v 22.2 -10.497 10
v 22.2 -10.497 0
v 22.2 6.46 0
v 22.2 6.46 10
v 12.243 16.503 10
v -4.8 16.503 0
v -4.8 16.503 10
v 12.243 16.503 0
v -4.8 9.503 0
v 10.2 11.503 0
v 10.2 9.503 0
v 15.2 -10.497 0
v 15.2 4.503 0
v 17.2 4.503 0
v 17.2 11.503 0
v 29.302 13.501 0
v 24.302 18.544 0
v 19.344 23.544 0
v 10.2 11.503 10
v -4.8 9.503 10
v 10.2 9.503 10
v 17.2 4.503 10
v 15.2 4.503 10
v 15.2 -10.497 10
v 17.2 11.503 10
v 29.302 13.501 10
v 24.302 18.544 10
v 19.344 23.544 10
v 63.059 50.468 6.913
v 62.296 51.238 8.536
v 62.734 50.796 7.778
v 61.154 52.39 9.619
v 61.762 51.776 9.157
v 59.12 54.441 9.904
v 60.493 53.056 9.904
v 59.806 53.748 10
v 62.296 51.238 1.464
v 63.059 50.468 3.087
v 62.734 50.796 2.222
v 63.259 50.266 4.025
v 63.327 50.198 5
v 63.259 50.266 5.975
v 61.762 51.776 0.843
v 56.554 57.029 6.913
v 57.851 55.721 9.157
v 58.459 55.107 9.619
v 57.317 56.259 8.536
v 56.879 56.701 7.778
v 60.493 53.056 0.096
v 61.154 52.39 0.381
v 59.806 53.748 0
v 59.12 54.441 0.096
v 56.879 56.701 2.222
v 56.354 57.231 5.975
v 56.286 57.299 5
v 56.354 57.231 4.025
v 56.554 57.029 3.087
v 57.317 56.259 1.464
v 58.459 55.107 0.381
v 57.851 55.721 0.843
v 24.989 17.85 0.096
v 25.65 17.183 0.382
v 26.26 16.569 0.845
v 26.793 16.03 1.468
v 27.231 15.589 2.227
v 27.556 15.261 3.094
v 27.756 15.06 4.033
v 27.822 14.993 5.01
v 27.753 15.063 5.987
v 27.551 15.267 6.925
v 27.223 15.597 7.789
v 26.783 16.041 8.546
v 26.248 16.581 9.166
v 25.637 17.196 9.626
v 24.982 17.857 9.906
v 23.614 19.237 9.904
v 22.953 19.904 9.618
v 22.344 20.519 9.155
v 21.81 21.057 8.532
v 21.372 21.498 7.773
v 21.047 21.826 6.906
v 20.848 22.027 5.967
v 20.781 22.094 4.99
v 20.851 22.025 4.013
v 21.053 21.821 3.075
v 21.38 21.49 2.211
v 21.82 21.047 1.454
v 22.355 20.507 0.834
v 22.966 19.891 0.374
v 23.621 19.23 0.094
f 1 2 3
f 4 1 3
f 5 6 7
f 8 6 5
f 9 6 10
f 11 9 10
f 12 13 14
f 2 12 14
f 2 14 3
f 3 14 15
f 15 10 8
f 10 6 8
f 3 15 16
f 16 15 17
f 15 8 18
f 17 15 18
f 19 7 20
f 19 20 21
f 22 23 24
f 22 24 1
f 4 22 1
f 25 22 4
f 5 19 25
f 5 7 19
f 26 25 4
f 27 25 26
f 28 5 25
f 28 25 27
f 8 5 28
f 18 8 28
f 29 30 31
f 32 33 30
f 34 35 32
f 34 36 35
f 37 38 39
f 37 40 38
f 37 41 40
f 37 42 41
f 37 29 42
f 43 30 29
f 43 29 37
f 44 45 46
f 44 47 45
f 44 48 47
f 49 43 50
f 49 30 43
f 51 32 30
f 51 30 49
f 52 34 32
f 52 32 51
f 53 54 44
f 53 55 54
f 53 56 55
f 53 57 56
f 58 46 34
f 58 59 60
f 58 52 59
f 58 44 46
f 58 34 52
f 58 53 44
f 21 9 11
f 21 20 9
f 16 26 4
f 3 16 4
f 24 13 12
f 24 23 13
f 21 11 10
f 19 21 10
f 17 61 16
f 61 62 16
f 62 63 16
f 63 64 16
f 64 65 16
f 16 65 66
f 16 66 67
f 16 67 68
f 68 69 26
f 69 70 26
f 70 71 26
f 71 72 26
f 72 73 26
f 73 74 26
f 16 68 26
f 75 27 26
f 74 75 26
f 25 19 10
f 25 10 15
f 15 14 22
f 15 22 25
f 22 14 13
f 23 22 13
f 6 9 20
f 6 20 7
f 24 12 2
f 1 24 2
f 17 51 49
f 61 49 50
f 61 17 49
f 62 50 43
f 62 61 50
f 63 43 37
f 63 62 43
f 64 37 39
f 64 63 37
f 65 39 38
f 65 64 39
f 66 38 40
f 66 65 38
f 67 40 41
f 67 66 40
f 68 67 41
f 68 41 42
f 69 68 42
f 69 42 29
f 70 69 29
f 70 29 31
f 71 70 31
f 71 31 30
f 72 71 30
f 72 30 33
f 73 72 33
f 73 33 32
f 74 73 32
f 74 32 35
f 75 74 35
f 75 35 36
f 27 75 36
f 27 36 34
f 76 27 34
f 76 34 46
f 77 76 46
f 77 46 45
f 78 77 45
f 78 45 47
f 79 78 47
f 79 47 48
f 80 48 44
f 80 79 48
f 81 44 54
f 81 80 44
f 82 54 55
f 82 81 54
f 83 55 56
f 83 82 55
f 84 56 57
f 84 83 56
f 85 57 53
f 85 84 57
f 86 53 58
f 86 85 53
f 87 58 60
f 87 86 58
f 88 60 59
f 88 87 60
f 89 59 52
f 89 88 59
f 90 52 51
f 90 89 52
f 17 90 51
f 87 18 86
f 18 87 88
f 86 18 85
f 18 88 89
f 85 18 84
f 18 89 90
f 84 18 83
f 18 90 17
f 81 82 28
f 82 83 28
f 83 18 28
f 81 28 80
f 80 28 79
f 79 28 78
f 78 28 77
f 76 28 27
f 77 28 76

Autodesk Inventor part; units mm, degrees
ref_plane "YZ Plane" through (0, 0, 0) normal (1, 0, 0) x (0, 1, 0)
ref_plane "XZ Plane" through (0, 0, 0) normal (0, 1, 0) x (-1, 0, 0)
ref_plane "XY Plane" through (0, 0, 0) normal (0, 0, 1) x (1, 0, 0)
sketch "Náčrt1" plane through (0, 0, 0) normal (0, 0, 1) x (1, 0, 0)
  point P0 (0, 0)
sketch "Náčrt2" plane through (0, 0, 0) normal (0, 0, 1) x (1, 0, 0)
  line L0 (17.2004, -10.497) -> (22.2004, -10.497)
  line L1 (-4.7996, 11.503) -> (-4.7996, 16.503)
  line L2 (-4.7996, 11.503) -> (17.2004, 11.503)
  line L3 (17.2004, -10.497) -> (17.2004, 11.503)
  line L4 (22.2004, -10.497) -> (22.2004, 11.503)
  line L5 (-4.7996, 16.503) -> (22.2004, 16.503)
  line L6 (22.2004, 11.503) -> (22.2004, 16.503)
  point P0 (0, 0)
  point P1 (15.2004, 9.503)
extrude "Vysunutí1" add sketch "Náčrt2" along normal blind 10
sketch "Náčrt3" plane through (0, 0, 10) normal (0, 0, 1) x (1, 0, 0)
  line L0 (17.2004, 11.503) -> (17.2004, -10.497) projected
  line L1 (22.2004, -10.497) -> (22.2004, 16.503) projected
  line L2 (22.2004, 16.503) -> (-4.7996, 16.503) projected
  line L3 (22.2004, 6.4599) -> (12.2431, 16.503)
  line L4 (12.2431, 16.503) -> (19.3444, 23.5436)
  line L5 (19.3444, 23.5436) -> (29.3017, 13.5006)
  line L6 (29.3017, 13.5006) -> (22.2004, 6.4599)
  point P0 (0, 0)
extrude "Vysunutí2" add sketch "Náčrt3" against normal blind 10 contours L1 L2 L4 L5 L6
sketch "Náčrt4" plane through (29.3017, 13.5006, 10) normal (0.7101, 0.7041, 0) x (0, 0, -1)
  point P0 (10, 11.0432)
sketch "Náčrt5" plane through (29.3017, 13.5006, 10) normal (0.7101, 0.7041, 0) x (0, 0, -1)
  line L0 (10, 0) -> (0, 0) projected
  line L1 (10, 22.5911) -> (10, 7.1016) projected
  line L2 (0, 14.1425) -> (10, 14.1425) projected
  line L3 (10, 7.1016) -> (10, -8.5213) projected
  line L4 (10, 7.1016) -> (0, 7.1016) projected
  circle A0 centre (5, 7.1016) radius 5
  point P0 (10, 11.0432)
extrude "Vysunutí3" add sketch "Náčrt5" along normal blind 50
sketch "Náčrt6" plane through (0, 0, 10) normal (0, 0, 1) x (1, 0, 0)
  line L0 (17.2004, 11.503) -> (17.2004, -10.497) projected
  line L1 (17.2004, -10.497) -> (17.2004, 4.503)
  line L2 (17.2004, 4.503) -> (15.2004, 4.503)
  line L3 (15.2004, 4.503) -> (15.2004, -10.497)
  line L4 (15.2004, -10.497) -> (17.2004, -10.497)
  line L5 (-4.7996, 11.503) -> (17.2004, 11.503) projected
  line L6 (-4.7996, 11.503) -> (-4.7996, 9.503)
  line L7 (-4.7996, 9.503) -> (10.2004, 9.503)
  line L8 (10.2004, 9.503) -> (10.2004, 11.503)
  line L9 (10.2004, 11.503) -> (-4.7996, 11.503)
  point P0 (0, 0)
extrude "Vysunutí4" add sketch "Náčrt6" against normal blind 10
properties part number "Součást3"
